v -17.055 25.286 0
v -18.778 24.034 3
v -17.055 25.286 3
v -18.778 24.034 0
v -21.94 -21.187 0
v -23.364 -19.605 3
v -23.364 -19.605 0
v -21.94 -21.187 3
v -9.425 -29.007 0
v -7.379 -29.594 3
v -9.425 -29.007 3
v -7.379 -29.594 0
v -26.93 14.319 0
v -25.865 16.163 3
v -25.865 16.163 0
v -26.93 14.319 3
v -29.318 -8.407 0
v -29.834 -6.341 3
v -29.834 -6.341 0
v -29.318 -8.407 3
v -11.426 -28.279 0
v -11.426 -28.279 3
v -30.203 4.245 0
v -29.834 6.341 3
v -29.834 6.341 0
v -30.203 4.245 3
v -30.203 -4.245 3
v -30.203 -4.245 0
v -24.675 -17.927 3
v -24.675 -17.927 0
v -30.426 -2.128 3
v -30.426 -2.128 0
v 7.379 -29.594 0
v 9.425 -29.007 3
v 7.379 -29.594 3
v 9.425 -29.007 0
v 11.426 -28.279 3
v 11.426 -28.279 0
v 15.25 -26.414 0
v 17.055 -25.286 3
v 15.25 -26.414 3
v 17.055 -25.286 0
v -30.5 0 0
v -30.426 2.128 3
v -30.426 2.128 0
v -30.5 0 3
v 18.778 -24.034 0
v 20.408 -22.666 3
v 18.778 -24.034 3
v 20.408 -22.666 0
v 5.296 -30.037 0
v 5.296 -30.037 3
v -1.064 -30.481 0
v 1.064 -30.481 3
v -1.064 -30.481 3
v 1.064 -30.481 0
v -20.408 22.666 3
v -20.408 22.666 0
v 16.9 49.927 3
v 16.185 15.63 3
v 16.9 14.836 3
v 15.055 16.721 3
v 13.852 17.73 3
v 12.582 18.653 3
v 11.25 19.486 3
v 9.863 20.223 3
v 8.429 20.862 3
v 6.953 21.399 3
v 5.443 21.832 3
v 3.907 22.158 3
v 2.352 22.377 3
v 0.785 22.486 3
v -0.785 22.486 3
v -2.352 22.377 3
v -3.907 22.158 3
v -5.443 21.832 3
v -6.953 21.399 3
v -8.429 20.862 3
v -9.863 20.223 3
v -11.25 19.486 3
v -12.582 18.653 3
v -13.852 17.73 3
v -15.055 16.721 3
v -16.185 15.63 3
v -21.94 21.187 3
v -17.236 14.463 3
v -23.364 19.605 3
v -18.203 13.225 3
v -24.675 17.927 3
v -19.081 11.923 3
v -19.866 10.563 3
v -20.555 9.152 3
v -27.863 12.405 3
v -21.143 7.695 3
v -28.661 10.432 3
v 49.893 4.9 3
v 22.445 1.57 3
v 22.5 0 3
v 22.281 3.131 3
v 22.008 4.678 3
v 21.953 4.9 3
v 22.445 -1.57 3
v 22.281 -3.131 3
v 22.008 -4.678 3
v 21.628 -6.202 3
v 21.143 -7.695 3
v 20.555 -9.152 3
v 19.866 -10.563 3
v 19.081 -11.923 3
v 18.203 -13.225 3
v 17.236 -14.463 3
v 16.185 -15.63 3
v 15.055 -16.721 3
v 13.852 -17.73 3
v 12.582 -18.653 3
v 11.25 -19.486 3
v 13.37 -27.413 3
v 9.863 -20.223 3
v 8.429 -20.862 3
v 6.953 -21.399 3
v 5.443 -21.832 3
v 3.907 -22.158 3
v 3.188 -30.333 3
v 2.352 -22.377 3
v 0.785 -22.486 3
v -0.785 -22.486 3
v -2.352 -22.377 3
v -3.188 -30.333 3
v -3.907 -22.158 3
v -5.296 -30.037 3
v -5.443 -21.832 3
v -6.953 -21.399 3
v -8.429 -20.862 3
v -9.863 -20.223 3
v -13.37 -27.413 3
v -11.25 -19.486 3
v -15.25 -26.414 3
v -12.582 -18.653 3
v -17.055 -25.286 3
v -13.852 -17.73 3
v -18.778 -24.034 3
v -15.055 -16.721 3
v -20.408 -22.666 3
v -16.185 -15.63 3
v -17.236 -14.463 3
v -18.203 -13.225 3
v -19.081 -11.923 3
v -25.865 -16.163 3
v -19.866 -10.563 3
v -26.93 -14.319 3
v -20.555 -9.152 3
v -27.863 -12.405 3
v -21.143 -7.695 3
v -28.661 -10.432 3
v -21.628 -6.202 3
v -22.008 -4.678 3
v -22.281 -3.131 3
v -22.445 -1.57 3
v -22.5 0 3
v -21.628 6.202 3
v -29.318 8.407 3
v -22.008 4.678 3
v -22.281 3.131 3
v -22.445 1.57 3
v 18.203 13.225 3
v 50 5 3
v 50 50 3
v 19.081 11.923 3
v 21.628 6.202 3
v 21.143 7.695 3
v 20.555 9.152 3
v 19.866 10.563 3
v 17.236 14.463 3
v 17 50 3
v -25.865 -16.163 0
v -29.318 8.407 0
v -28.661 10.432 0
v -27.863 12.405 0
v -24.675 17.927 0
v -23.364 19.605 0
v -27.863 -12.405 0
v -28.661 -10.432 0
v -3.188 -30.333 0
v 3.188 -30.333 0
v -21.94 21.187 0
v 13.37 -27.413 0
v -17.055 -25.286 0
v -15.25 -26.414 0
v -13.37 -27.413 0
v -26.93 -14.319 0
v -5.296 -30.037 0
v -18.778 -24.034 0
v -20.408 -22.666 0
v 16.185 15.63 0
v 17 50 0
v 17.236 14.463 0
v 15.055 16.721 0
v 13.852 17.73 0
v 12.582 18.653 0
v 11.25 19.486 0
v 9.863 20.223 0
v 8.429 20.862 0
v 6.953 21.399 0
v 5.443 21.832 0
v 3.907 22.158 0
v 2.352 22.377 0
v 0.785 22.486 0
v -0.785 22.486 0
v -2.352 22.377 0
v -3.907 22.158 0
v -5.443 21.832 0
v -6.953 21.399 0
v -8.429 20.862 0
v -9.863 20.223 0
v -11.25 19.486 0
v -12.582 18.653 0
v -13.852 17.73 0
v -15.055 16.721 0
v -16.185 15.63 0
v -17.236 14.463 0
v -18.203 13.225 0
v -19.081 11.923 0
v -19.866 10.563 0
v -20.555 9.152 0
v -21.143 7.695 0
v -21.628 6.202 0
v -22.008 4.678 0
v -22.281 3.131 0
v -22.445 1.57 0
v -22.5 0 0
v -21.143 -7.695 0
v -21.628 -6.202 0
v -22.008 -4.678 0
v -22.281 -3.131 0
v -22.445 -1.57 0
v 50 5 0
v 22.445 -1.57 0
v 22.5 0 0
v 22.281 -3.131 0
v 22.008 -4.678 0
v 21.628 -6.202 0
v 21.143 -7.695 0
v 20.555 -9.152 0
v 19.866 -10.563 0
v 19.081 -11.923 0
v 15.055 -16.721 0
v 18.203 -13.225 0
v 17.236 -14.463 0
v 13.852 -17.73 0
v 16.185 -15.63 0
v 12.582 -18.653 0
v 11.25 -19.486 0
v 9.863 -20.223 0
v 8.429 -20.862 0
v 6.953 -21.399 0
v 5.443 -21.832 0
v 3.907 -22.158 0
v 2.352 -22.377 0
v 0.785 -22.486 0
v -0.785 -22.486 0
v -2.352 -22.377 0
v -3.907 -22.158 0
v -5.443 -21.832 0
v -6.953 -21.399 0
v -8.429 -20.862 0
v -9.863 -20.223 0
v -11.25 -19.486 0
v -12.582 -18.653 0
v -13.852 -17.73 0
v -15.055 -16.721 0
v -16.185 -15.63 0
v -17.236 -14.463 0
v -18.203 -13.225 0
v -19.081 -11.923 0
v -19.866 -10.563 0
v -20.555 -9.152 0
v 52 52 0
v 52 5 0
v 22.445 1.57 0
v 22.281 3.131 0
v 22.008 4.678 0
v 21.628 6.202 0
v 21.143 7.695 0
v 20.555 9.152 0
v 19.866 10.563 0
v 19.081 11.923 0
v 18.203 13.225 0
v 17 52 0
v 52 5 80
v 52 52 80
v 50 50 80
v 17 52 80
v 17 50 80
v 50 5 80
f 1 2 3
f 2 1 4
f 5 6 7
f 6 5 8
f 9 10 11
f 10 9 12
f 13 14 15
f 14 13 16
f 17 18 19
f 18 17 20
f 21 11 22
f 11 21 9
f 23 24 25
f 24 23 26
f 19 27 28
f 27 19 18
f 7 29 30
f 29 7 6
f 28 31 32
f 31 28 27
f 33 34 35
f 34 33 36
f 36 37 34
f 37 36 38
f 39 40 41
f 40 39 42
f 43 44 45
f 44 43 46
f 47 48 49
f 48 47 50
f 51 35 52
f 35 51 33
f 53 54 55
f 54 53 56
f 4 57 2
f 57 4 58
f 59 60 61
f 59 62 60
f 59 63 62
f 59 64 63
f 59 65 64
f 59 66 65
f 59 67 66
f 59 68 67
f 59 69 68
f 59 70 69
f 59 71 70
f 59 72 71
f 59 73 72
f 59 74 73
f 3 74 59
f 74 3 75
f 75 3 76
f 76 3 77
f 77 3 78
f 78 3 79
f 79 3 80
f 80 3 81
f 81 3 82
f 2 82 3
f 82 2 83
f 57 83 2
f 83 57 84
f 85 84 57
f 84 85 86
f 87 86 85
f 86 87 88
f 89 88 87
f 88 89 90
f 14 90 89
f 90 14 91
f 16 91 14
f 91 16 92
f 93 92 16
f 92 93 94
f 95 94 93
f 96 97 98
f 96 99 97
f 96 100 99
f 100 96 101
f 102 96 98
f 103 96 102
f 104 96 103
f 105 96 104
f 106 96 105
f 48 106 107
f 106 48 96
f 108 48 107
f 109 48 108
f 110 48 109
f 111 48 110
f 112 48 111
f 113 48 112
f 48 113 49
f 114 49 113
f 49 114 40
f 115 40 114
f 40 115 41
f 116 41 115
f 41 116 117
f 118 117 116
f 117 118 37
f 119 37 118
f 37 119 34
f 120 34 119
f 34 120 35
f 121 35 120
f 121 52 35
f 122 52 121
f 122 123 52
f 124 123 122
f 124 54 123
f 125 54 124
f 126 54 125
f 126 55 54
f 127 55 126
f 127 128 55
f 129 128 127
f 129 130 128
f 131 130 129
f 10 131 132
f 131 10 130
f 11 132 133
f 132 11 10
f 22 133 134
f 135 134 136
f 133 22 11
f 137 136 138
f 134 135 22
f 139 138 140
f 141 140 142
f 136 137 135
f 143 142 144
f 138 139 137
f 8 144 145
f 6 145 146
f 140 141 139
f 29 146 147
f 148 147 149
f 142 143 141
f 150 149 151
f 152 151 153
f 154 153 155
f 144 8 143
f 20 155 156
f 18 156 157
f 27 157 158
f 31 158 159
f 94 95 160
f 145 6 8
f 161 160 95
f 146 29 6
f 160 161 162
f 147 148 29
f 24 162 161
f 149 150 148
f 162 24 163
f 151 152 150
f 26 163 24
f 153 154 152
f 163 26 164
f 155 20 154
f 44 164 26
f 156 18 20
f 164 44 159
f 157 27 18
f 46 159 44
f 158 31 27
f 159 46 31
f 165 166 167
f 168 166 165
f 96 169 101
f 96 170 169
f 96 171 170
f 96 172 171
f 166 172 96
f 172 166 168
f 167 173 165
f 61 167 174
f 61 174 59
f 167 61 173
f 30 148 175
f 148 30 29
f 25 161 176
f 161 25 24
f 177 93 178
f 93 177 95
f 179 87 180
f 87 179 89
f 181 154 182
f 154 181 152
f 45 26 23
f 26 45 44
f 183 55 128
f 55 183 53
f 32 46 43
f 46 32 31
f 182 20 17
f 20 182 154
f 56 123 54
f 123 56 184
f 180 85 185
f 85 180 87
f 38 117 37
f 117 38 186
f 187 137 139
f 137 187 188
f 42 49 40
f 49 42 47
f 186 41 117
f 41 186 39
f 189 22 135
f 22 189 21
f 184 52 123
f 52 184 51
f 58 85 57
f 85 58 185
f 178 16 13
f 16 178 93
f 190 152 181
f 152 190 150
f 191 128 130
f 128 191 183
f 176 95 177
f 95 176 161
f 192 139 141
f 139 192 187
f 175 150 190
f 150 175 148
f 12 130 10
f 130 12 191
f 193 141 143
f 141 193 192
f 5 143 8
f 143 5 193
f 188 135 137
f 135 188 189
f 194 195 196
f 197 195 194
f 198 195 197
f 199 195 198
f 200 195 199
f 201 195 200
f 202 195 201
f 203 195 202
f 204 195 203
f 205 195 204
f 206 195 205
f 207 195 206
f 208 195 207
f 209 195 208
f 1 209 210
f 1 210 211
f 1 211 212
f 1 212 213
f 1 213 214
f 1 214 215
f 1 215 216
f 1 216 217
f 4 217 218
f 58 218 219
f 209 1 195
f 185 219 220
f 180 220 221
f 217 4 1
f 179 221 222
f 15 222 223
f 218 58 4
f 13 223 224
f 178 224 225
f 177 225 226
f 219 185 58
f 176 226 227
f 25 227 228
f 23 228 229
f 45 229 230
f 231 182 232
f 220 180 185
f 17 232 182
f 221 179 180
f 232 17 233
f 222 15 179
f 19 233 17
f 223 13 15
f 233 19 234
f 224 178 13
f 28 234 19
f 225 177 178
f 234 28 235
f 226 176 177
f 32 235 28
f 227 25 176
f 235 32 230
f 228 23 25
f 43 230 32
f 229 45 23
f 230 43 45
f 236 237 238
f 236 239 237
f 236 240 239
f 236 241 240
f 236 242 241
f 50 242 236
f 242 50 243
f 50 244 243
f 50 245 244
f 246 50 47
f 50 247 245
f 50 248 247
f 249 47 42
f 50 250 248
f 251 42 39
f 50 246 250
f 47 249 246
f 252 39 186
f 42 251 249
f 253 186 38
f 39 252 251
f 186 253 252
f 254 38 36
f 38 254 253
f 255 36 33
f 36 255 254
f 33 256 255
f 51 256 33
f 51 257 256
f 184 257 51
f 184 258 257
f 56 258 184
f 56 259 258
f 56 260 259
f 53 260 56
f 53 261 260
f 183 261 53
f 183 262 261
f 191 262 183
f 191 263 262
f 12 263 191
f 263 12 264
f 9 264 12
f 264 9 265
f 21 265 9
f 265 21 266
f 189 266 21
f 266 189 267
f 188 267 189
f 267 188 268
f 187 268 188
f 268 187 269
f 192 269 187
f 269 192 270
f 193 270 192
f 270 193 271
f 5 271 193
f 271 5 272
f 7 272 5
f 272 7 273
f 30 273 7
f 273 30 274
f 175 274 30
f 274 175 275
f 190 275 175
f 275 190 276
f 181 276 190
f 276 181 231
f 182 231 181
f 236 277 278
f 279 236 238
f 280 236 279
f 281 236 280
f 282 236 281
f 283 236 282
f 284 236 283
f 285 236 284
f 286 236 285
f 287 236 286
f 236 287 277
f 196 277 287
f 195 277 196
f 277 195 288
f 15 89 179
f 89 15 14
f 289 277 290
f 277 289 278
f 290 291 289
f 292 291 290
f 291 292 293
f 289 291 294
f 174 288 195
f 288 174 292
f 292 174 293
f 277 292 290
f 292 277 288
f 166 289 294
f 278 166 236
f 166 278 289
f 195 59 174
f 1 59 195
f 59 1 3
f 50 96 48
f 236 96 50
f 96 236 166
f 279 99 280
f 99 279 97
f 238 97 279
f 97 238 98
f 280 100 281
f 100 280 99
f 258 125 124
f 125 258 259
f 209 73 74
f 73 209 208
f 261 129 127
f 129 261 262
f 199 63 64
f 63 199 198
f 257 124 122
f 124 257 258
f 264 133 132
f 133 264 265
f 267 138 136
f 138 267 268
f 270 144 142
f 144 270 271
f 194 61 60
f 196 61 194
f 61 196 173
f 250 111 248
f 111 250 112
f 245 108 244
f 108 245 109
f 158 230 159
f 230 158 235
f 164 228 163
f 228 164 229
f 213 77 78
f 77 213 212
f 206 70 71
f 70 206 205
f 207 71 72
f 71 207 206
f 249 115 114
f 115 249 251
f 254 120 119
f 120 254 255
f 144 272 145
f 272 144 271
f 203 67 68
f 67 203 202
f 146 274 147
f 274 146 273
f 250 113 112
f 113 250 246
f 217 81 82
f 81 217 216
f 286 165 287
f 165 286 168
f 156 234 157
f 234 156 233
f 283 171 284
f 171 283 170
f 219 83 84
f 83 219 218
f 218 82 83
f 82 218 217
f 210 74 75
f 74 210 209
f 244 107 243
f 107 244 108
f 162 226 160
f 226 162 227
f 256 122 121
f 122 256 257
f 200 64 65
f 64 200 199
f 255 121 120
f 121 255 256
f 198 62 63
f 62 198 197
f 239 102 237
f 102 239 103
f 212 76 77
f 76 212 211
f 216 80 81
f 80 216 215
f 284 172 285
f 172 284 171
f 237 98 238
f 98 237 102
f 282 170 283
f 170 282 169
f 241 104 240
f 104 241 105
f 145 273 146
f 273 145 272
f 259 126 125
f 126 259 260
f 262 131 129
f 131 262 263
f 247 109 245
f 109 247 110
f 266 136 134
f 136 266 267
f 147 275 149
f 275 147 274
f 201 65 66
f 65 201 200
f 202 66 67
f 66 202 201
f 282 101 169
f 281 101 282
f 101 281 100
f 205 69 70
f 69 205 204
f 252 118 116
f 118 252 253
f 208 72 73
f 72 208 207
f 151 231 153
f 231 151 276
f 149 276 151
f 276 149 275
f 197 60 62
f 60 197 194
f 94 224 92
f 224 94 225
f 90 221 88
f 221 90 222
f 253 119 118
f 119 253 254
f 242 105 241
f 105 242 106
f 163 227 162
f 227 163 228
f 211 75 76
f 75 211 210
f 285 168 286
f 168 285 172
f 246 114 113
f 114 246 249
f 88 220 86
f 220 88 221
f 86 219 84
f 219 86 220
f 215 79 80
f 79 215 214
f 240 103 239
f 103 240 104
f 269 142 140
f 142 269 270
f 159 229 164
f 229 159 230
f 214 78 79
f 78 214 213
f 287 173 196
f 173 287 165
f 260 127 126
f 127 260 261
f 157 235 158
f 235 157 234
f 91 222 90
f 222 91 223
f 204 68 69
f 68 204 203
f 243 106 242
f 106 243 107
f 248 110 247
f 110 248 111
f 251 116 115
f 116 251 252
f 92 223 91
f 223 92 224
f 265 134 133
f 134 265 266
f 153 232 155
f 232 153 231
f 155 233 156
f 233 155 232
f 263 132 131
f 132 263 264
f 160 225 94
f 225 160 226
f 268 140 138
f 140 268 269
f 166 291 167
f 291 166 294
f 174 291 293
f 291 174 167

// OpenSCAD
socket=45;
socket_wall=8;
socket_h=3;

bulb=100;
pad=0.1;
$fn=90;

clip=20;
clip_x=33;
clip_y=45;
clip_z=80;
clip_wall=2;

module socket(padding=0, wall=0) {
    translate([0,0,-padding])
    cylinder(d=socket+wall*2,h=socket_h+padding*2);
}

module clip(padding=0, wall=0, base=0) {
    translate([-clip_x-padding+bulb/2,-padding-clip_y+bulb/2,base])
    cube([clip_x+wall+padding,clip_y+wall+padding,clip_z+padding]);
}

module connection() {
    hull() {
        difference() {
            clip();
            clip(wall=pad, padding=pad, base=socket_h);
        }
        socket(wall=socket_wall);
    }
}

module positive() {
    socket(wall=socket_wall);
    clip(wall=clip_wall);
    connection();
}

module negative() {
    socket(padding=pad);
    clip(padding=pad,base=socket_h);
}

module assembled() {
    difference() {
        positive();
        negative();
    }
}

assembled();
